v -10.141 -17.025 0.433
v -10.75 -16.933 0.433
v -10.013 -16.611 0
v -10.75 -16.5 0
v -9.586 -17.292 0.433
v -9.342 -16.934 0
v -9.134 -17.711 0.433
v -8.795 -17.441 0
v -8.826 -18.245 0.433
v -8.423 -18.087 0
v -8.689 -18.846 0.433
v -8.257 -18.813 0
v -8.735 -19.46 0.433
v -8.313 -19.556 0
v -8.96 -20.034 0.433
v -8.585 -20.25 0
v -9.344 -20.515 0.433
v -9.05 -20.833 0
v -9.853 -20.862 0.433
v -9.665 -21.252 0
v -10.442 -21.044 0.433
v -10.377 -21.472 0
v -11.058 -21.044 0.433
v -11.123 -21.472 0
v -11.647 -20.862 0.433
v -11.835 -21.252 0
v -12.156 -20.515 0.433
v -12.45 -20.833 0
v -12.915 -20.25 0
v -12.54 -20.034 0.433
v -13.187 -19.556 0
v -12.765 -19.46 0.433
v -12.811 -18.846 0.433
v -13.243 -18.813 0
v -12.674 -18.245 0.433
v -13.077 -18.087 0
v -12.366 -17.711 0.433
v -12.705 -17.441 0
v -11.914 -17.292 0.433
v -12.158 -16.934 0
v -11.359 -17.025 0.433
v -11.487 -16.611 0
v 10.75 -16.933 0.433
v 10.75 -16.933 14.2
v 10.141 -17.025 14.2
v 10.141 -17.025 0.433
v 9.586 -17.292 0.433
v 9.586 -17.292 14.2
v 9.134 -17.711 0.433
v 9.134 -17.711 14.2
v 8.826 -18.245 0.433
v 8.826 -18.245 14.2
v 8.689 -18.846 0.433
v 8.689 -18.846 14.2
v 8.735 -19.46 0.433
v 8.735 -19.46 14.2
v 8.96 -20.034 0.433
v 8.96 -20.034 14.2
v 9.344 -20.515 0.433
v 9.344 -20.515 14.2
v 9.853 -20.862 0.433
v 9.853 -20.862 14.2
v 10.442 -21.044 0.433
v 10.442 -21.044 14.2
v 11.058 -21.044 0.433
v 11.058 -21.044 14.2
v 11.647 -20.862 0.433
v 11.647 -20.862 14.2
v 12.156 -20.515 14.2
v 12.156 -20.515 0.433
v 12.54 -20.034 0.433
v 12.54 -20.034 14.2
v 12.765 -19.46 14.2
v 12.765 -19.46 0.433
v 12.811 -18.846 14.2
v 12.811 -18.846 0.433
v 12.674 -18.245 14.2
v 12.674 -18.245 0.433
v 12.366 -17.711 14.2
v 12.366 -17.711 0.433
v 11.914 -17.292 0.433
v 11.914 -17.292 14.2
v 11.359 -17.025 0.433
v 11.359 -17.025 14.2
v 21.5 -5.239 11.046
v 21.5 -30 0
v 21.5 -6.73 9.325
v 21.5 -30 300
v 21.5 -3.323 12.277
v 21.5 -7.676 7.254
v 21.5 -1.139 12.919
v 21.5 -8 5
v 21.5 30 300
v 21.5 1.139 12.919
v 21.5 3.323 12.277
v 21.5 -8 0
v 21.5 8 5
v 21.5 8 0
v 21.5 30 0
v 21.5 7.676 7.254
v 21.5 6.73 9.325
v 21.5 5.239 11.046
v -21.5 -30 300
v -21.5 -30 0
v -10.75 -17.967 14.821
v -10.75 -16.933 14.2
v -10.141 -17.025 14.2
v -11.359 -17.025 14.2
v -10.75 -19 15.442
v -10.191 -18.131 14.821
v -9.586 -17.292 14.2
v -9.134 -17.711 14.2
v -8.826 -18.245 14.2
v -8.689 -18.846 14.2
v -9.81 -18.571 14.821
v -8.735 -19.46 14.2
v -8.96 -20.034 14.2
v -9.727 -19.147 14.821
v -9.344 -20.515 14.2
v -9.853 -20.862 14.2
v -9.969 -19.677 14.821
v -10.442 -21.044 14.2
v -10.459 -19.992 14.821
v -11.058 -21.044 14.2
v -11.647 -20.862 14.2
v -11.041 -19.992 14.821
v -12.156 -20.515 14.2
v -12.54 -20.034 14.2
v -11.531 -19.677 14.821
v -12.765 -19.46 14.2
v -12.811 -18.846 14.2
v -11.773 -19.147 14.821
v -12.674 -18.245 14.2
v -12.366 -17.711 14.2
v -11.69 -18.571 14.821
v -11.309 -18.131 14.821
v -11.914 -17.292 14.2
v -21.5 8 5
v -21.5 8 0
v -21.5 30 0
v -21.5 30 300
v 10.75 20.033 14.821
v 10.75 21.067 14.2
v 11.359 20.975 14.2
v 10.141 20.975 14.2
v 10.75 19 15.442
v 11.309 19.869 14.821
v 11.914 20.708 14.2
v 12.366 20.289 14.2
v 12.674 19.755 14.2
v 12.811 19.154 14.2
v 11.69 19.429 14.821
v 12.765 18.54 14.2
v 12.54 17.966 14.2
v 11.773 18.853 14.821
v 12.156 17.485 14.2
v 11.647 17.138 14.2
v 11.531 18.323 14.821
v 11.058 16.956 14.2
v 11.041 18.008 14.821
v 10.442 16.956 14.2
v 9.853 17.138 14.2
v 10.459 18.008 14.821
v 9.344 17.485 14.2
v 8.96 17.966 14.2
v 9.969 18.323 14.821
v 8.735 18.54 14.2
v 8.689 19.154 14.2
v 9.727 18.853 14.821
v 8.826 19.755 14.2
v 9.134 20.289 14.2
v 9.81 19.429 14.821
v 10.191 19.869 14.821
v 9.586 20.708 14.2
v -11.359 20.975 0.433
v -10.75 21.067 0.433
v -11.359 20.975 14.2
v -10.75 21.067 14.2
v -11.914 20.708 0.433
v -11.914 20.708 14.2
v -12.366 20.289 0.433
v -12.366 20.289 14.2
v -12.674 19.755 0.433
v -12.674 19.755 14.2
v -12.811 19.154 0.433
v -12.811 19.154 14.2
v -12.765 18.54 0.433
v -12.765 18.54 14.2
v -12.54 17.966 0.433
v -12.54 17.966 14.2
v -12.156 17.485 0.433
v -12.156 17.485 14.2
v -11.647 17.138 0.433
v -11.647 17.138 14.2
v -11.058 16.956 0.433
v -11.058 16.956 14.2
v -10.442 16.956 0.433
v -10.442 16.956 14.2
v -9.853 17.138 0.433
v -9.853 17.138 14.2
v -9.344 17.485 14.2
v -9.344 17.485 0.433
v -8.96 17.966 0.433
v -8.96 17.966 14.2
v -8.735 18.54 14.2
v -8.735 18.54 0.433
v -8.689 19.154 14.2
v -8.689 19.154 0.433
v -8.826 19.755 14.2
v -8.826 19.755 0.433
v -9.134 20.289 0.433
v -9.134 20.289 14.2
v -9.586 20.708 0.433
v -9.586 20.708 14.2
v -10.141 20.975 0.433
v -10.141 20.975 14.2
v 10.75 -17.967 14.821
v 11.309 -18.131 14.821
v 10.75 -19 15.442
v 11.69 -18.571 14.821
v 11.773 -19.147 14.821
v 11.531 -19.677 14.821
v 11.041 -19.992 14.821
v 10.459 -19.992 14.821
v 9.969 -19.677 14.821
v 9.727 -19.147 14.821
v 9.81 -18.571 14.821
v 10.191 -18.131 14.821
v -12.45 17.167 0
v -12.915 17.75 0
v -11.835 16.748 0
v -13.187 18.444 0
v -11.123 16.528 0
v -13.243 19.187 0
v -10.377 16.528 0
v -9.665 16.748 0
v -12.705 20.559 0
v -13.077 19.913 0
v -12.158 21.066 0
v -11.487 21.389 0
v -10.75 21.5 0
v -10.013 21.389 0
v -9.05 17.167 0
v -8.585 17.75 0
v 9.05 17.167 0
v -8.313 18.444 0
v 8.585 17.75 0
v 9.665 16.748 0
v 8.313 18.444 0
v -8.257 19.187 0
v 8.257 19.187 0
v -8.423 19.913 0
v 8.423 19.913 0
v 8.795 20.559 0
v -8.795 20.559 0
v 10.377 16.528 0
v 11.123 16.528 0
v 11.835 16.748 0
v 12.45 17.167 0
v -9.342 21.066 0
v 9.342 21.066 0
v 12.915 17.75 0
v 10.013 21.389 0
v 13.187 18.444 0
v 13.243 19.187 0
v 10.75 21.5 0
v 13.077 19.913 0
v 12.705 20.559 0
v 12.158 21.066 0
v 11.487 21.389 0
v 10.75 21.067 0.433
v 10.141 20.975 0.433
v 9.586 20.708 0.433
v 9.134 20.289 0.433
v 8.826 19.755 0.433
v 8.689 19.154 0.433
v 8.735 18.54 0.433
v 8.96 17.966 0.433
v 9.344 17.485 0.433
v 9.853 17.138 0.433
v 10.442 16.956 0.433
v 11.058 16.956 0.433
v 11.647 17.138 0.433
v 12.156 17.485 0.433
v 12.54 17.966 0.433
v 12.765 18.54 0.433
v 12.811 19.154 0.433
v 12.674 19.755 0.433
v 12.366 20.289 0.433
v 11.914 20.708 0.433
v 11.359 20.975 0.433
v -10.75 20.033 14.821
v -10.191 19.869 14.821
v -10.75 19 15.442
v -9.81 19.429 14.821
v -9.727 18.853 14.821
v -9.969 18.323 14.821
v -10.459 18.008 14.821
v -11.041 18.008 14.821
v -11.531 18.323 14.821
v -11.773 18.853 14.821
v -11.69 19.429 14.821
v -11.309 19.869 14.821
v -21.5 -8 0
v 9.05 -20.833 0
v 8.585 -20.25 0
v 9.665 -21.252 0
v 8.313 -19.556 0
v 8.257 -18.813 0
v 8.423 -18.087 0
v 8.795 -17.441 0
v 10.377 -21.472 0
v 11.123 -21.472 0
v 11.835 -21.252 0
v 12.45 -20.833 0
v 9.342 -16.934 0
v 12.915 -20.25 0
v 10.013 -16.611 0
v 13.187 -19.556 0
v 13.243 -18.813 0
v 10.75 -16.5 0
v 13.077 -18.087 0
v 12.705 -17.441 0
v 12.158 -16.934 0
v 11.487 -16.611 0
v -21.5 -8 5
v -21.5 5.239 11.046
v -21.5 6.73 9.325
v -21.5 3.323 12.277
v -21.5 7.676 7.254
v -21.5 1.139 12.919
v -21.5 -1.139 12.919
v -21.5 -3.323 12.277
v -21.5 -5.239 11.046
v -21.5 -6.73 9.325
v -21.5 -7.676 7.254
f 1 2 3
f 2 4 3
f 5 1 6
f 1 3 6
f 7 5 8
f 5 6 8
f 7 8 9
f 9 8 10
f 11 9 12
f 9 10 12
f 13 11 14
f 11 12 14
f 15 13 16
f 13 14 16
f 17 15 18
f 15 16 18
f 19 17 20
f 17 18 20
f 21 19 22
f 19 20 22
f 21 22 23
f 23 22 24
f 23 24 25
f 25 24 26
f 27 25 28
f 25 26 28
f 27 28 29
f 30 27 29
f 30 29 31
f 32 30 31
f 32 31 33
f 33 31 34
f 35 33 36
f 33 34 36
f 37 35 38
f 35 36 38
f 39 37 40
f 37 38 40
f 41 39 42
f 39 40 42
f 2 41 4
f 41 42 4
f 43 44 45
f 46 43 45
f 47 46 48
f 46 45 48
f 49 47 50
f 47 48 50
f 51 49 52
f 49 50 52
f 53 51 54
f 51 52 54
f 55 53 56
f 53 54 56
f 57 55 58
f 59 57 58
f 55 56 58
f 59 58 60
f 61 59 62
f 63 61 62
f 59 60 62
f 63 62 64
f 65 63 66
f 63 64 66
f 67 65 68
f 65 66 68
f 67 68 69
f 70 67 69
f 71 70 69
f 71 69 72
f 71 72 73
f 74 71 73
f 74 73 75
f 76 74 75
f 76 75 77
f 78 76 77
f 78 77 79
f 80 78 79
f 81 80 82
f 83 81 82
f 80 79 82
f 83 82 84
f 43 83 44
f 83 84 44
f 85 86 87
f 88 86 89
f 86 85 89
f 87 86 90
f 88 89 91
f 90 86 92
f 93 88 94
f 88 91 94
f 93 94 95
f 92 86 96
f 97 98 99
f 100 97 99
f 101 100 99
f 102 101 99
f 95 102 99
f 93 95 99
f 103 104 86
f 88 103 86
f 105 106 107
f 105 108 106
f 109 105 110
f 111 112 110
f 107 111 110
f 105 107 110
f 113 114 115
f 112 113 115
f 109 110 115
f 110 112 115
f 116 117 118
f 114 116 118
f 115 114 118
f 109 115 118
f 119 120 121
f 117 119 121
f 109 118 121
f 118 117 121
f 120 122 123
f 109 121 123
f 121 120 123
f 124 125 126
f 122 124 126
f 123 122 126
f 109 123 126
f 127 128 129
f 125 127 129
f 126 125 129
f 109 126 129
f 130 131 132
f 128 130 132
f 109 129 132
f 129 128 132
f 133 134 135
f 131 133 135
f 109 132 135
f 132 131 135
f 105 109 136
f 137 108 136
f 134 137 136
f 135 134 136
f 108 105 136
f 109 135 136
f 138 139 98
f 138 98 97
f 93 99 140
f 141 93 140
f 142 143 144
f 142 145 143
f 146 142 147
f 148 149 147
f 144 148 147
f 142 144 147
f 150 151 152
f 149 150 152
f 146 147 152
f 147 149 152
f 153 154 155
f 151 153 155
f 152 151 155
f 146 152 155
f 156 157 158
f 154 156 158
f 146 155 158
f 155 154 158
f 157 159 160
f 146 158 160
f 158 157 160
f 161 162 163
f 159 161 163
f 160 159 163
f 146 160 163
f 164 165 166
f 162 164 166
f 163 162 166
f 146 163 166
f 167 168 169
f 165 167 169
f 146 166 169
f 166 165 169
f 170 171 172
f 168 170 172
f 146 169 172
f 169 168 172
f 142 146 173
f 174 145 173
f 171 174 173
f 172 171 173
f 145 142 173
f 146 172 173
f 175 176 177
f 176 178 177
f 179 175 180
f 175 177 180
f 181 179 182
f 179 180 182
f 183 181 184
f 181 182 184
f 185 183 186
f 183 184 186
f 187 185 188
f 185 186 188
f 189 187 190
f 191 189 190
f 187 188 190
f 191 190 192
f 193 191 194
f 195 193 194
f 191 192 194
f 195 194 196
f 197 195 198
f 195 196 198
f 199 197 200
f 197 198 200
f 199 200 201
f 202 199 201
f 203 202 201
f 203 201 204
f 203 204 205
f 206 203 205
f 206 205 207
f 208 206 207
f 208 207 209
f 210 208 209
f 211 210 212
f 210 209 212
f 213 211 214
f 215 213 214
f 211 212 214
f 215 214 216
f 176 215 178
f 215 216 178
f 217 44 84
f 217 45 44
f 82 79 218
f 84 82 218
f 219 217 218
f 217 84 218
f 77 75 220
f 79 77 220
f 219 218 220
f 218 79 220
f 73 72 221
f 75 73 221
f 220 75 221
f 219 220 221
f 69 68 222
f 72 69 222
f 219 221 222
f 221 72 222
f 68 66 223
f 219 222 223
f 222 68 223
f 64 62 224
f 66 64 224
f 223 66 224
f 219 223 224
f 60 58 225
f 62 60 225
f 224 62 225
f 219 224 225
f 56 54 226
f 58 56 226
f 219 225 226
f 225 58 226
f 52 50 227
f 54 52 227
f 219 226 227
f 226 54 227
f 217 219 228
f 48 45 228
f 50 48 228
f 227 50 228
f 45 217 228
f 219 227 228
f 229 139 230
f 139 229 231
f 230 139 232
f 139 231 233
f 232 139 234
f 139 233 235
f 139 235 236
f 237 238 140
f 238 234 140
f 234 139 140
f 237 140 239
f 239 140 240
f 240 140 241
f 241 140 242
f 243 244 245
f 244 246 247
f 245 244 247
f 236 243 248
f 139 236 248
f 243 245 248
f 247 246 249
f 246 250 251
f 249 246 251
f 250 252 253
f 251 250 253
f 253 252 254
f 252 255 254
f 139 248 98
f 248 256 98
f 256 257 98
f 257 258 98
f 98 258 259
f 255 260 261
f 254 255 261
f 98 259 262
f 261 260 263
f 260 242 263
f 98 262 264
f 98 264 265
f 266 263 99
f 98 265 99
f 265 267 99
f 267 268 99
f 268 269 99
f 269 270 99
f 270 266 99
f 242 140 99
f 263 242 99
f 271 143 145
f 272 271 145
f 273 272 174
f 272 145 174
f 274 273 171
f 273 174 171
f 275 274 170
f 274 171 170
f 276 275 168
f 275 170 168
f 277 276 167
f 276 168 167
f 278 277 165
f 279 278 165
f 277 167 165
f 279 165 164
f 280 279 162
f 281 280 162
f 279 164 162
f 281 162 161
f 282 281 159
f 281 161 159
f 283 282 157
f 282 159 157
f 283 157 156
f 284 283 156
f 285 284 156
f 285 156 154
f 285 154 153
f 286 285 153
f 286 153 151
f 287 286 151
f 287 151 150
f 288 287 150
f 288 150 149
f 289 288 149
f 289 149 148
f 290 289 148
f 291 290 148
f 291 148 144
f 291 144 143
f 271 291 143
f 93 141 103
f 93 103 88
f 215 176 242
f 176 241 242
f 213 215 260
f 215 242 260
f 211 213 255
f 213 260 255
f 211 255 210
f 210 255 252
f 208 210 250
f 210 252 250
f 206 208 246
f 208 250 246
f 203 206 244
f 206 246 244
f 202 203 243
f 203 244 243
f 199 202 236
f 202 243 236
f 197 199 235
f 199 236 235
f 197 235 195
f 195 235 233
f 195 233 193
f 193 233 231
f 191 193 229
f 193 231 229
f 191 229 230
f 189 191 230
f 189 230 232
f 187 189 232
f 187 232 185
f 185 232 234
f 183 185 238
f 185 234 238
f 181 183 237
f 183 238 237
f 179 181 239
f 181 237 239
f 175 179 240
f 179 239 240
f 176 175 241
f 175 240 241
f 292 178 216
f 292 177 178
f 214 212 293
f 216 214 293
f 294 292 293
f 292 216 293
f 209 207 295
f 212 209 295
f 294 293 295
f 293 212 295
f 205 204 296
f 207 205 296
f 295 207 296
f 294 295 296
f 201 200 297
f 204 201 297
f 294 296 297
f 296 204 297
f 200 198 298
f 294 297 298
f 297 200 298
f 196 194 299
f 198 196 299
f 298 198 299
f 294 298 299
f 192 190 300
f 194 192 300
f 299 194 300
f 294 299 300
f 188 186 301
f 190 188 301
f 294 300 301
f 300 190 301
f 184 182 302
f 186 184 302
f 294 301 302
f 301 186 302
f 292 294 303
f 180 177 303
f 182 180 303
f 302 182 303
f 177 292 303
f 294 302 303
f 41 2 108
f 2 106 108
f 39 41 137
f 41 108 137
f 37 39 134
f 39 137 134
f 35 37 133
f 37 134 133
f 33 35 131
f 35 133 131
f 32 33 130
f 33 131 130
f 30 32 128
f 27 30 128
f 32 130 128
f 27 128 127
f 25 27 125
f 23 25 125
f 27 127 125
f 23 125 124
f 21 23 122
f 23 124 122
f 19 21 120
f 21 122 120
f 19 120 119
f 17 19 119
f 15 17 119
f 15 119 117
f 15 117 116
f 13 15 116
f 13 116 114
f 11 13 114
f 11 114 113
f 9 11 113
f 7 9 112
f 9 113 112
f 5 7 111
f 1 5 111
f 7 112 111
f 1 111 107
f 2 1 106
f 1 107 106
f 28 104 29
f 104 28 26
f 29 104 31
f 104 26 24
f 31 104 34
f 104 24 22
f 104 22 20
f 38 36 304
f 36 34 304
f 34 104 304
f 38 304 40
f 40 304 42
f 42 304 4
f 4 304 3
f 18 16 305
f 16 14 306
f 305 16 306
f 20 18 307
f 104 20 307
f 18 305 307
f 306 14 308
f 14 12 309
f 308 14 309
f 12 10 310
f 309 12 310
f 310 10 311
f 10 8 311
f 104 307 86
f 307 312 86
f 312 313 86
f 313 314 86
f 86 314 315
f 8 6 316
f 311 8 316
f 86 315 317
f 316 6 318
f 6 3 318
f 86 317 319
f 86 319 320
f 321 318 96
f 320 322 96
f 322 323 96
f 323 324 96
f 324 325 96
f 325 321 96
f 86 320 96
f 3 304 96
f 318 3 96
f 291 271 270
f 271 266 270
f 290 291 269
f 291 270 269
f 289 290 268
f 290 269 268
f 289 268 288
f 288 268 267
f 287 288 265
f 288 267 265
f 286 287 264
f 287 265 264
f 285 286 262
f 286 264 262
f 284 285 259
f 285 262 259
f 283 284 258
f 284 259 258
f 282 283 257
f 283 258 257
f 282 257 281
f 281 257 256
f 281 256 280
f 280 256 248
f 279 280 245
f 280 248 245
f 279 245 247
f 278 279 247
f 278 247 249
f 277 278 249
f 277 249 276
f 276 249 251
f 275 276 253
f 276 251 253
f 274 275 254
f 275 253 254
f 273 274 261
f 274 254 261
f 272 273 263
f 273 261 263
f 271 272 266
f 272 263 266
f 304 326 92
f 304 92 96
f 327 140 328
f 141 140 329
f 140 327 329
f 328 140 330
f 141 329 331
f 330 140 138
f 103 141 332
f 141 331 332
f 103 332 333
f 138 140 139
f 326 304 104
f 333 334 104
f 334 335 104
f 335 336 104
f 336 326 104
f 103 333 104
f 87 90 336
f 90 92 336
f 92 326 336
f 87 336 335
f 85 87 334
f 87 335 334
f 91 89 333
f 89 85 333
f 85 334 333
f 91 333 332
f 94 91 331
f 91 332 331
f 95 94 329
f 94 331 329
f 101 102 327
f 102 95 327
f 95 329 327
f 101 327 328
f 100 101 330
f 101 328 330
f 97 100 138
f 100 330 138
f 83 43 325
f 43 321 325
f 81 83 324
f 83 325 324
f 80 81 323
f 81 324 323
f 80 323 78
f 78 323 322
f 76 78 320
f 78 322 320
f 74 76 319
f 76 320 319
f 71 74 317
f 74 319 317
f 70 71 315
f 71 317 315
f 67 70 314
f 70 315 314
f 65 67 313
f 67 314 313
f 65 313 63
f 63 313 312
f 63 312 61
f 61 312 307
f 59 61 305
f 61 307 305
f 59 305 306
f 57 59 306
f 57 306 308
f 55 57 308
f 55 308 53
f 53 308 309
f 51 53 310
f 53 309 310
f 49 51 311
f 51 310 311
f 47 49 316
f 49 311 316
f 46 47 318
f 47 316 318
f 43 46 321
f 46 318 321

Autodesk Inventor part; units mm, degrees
ref_plane "YZ Plane" through (0, 0, 0) normal (1, 0, 0) x (0, 1, 0)
ref_plane "XZ Plane" through (0, 0, 0) normal (0, 1, 0) x (-1, 0, 0)
ref_plane "XY Plane" through (0, 0, 0) normal (0, 0, 1) x (1, 0, 0)
sketch "Sketch1" plane through (0, 0, 0) normal (0, 0, 1) x (1, 0, 0)
  line L0 (-30.1, 0) -> (30.1, 0) construction
  line L1 (0, 42) -> (0, -42) construction
  line L2 (-21.5, -30) -> (21.5, -30)
  line L3 (21.5, -30) -> (21.5, 30)
  line L4 (21.5, 30) -> (-21.5, 30)
  line L5 (-21.5, 30) -> (-21.5, -30)
  line L6 (-21.5, -30) -> (21.5, 30) construction
  line L7 (21.5, -30) -> (-21.5, 30) construction
  point P0 (0, 0)
  dimension "d0" = 43
  dimension "d1" = 60
extrude "Extrusion1" add sketch "Sketch1" along normal blind 300
sketch "Sketch4" plane through (-21.5, -30, 0) normal (-1, 0, 0) x (0, 0, 1)
  line L0 (0, 60) -> (0, 0) construction
  line L1 (-60, 30) -> (360, 30) construction
  line L2 (0, 38) -> (5, 38)
  line L3 (13, 30) -> (13, 30)
  line L4 (5, 22) -> (0, 22)
  line L5 (0, 22) -> (0, 38)
  arc A0 (13, 30) -> (5, 38) centre (5, 30) ccw
  arc A1 (5, 22) -> (13, 30) centre (5, 30) ccw
  point P0 (0, 30)
  point P1 (13, 22)
  point P2 (13, 38)
  dimension "d7" = 16
  dimension "d8" = 13
  dimension "d9" = 8
extrude "Extrusion3" cut sketch "Sketch4" against normal through all
sketch "Sketch5" plane through (0, 0, 0) normal (0, 0, -1) x (-1, 0, 0)
  line L0 (0, -42) -> (0, 42) construction
  line L1 (-30.1, 0) -> (30.1, 0) construction
  line L2 (-10.75, -19) -> (10.75, -19) construction
  line L3 (10.75, -19) -> (10.75, 19) construction
  line L4 (10.75, 19) -> (-10.75, 19) construction
  line L5 (-10.75, 19) -> (-10.75, -19) construction
  line L6 (-10.75, -19) -> (10.75, 19) construction
  line L7 (10.75, -19) -> (-10.75, 19) construction
  line L8 (21.5, -30) -> (-21.5, -30) projected
  line L9 (-21.5, 30) -> (21.5, 30) projected
  line L10 (21.5, -8) -> (-21.5, -8) construction
  line L11 (-21.5, 8) -> (21.5, 8) construction
  point P0 (0, 0)
  dimension "d12" = 21.5
  dimension "d13" = 38
  dimension "d14" = 60
  dimension "d15" = 16
  dimension "d16" = 43
hole "Hole1" at (10.75, 19, 0) at (-10.75, 19, 0) at (-10.75, -19, 0) at (10.75, -19, 0) direction (0, 0, 1) diameter 4.134 depth 14.2 tip angle 118 countersink diameter 5 countersink angle 90 thread size "M5x0.8" class "6H" standard "ISO Metric profile"
equation "\"d9\" = 0.5 * d7"
equation "\"d12\" = 0.5 * d16"
equation "\"d13\" = 0.5 * d14 + 0.5 * d15"
properties part number "10-002-ARM" material "Aluminum 6061"
